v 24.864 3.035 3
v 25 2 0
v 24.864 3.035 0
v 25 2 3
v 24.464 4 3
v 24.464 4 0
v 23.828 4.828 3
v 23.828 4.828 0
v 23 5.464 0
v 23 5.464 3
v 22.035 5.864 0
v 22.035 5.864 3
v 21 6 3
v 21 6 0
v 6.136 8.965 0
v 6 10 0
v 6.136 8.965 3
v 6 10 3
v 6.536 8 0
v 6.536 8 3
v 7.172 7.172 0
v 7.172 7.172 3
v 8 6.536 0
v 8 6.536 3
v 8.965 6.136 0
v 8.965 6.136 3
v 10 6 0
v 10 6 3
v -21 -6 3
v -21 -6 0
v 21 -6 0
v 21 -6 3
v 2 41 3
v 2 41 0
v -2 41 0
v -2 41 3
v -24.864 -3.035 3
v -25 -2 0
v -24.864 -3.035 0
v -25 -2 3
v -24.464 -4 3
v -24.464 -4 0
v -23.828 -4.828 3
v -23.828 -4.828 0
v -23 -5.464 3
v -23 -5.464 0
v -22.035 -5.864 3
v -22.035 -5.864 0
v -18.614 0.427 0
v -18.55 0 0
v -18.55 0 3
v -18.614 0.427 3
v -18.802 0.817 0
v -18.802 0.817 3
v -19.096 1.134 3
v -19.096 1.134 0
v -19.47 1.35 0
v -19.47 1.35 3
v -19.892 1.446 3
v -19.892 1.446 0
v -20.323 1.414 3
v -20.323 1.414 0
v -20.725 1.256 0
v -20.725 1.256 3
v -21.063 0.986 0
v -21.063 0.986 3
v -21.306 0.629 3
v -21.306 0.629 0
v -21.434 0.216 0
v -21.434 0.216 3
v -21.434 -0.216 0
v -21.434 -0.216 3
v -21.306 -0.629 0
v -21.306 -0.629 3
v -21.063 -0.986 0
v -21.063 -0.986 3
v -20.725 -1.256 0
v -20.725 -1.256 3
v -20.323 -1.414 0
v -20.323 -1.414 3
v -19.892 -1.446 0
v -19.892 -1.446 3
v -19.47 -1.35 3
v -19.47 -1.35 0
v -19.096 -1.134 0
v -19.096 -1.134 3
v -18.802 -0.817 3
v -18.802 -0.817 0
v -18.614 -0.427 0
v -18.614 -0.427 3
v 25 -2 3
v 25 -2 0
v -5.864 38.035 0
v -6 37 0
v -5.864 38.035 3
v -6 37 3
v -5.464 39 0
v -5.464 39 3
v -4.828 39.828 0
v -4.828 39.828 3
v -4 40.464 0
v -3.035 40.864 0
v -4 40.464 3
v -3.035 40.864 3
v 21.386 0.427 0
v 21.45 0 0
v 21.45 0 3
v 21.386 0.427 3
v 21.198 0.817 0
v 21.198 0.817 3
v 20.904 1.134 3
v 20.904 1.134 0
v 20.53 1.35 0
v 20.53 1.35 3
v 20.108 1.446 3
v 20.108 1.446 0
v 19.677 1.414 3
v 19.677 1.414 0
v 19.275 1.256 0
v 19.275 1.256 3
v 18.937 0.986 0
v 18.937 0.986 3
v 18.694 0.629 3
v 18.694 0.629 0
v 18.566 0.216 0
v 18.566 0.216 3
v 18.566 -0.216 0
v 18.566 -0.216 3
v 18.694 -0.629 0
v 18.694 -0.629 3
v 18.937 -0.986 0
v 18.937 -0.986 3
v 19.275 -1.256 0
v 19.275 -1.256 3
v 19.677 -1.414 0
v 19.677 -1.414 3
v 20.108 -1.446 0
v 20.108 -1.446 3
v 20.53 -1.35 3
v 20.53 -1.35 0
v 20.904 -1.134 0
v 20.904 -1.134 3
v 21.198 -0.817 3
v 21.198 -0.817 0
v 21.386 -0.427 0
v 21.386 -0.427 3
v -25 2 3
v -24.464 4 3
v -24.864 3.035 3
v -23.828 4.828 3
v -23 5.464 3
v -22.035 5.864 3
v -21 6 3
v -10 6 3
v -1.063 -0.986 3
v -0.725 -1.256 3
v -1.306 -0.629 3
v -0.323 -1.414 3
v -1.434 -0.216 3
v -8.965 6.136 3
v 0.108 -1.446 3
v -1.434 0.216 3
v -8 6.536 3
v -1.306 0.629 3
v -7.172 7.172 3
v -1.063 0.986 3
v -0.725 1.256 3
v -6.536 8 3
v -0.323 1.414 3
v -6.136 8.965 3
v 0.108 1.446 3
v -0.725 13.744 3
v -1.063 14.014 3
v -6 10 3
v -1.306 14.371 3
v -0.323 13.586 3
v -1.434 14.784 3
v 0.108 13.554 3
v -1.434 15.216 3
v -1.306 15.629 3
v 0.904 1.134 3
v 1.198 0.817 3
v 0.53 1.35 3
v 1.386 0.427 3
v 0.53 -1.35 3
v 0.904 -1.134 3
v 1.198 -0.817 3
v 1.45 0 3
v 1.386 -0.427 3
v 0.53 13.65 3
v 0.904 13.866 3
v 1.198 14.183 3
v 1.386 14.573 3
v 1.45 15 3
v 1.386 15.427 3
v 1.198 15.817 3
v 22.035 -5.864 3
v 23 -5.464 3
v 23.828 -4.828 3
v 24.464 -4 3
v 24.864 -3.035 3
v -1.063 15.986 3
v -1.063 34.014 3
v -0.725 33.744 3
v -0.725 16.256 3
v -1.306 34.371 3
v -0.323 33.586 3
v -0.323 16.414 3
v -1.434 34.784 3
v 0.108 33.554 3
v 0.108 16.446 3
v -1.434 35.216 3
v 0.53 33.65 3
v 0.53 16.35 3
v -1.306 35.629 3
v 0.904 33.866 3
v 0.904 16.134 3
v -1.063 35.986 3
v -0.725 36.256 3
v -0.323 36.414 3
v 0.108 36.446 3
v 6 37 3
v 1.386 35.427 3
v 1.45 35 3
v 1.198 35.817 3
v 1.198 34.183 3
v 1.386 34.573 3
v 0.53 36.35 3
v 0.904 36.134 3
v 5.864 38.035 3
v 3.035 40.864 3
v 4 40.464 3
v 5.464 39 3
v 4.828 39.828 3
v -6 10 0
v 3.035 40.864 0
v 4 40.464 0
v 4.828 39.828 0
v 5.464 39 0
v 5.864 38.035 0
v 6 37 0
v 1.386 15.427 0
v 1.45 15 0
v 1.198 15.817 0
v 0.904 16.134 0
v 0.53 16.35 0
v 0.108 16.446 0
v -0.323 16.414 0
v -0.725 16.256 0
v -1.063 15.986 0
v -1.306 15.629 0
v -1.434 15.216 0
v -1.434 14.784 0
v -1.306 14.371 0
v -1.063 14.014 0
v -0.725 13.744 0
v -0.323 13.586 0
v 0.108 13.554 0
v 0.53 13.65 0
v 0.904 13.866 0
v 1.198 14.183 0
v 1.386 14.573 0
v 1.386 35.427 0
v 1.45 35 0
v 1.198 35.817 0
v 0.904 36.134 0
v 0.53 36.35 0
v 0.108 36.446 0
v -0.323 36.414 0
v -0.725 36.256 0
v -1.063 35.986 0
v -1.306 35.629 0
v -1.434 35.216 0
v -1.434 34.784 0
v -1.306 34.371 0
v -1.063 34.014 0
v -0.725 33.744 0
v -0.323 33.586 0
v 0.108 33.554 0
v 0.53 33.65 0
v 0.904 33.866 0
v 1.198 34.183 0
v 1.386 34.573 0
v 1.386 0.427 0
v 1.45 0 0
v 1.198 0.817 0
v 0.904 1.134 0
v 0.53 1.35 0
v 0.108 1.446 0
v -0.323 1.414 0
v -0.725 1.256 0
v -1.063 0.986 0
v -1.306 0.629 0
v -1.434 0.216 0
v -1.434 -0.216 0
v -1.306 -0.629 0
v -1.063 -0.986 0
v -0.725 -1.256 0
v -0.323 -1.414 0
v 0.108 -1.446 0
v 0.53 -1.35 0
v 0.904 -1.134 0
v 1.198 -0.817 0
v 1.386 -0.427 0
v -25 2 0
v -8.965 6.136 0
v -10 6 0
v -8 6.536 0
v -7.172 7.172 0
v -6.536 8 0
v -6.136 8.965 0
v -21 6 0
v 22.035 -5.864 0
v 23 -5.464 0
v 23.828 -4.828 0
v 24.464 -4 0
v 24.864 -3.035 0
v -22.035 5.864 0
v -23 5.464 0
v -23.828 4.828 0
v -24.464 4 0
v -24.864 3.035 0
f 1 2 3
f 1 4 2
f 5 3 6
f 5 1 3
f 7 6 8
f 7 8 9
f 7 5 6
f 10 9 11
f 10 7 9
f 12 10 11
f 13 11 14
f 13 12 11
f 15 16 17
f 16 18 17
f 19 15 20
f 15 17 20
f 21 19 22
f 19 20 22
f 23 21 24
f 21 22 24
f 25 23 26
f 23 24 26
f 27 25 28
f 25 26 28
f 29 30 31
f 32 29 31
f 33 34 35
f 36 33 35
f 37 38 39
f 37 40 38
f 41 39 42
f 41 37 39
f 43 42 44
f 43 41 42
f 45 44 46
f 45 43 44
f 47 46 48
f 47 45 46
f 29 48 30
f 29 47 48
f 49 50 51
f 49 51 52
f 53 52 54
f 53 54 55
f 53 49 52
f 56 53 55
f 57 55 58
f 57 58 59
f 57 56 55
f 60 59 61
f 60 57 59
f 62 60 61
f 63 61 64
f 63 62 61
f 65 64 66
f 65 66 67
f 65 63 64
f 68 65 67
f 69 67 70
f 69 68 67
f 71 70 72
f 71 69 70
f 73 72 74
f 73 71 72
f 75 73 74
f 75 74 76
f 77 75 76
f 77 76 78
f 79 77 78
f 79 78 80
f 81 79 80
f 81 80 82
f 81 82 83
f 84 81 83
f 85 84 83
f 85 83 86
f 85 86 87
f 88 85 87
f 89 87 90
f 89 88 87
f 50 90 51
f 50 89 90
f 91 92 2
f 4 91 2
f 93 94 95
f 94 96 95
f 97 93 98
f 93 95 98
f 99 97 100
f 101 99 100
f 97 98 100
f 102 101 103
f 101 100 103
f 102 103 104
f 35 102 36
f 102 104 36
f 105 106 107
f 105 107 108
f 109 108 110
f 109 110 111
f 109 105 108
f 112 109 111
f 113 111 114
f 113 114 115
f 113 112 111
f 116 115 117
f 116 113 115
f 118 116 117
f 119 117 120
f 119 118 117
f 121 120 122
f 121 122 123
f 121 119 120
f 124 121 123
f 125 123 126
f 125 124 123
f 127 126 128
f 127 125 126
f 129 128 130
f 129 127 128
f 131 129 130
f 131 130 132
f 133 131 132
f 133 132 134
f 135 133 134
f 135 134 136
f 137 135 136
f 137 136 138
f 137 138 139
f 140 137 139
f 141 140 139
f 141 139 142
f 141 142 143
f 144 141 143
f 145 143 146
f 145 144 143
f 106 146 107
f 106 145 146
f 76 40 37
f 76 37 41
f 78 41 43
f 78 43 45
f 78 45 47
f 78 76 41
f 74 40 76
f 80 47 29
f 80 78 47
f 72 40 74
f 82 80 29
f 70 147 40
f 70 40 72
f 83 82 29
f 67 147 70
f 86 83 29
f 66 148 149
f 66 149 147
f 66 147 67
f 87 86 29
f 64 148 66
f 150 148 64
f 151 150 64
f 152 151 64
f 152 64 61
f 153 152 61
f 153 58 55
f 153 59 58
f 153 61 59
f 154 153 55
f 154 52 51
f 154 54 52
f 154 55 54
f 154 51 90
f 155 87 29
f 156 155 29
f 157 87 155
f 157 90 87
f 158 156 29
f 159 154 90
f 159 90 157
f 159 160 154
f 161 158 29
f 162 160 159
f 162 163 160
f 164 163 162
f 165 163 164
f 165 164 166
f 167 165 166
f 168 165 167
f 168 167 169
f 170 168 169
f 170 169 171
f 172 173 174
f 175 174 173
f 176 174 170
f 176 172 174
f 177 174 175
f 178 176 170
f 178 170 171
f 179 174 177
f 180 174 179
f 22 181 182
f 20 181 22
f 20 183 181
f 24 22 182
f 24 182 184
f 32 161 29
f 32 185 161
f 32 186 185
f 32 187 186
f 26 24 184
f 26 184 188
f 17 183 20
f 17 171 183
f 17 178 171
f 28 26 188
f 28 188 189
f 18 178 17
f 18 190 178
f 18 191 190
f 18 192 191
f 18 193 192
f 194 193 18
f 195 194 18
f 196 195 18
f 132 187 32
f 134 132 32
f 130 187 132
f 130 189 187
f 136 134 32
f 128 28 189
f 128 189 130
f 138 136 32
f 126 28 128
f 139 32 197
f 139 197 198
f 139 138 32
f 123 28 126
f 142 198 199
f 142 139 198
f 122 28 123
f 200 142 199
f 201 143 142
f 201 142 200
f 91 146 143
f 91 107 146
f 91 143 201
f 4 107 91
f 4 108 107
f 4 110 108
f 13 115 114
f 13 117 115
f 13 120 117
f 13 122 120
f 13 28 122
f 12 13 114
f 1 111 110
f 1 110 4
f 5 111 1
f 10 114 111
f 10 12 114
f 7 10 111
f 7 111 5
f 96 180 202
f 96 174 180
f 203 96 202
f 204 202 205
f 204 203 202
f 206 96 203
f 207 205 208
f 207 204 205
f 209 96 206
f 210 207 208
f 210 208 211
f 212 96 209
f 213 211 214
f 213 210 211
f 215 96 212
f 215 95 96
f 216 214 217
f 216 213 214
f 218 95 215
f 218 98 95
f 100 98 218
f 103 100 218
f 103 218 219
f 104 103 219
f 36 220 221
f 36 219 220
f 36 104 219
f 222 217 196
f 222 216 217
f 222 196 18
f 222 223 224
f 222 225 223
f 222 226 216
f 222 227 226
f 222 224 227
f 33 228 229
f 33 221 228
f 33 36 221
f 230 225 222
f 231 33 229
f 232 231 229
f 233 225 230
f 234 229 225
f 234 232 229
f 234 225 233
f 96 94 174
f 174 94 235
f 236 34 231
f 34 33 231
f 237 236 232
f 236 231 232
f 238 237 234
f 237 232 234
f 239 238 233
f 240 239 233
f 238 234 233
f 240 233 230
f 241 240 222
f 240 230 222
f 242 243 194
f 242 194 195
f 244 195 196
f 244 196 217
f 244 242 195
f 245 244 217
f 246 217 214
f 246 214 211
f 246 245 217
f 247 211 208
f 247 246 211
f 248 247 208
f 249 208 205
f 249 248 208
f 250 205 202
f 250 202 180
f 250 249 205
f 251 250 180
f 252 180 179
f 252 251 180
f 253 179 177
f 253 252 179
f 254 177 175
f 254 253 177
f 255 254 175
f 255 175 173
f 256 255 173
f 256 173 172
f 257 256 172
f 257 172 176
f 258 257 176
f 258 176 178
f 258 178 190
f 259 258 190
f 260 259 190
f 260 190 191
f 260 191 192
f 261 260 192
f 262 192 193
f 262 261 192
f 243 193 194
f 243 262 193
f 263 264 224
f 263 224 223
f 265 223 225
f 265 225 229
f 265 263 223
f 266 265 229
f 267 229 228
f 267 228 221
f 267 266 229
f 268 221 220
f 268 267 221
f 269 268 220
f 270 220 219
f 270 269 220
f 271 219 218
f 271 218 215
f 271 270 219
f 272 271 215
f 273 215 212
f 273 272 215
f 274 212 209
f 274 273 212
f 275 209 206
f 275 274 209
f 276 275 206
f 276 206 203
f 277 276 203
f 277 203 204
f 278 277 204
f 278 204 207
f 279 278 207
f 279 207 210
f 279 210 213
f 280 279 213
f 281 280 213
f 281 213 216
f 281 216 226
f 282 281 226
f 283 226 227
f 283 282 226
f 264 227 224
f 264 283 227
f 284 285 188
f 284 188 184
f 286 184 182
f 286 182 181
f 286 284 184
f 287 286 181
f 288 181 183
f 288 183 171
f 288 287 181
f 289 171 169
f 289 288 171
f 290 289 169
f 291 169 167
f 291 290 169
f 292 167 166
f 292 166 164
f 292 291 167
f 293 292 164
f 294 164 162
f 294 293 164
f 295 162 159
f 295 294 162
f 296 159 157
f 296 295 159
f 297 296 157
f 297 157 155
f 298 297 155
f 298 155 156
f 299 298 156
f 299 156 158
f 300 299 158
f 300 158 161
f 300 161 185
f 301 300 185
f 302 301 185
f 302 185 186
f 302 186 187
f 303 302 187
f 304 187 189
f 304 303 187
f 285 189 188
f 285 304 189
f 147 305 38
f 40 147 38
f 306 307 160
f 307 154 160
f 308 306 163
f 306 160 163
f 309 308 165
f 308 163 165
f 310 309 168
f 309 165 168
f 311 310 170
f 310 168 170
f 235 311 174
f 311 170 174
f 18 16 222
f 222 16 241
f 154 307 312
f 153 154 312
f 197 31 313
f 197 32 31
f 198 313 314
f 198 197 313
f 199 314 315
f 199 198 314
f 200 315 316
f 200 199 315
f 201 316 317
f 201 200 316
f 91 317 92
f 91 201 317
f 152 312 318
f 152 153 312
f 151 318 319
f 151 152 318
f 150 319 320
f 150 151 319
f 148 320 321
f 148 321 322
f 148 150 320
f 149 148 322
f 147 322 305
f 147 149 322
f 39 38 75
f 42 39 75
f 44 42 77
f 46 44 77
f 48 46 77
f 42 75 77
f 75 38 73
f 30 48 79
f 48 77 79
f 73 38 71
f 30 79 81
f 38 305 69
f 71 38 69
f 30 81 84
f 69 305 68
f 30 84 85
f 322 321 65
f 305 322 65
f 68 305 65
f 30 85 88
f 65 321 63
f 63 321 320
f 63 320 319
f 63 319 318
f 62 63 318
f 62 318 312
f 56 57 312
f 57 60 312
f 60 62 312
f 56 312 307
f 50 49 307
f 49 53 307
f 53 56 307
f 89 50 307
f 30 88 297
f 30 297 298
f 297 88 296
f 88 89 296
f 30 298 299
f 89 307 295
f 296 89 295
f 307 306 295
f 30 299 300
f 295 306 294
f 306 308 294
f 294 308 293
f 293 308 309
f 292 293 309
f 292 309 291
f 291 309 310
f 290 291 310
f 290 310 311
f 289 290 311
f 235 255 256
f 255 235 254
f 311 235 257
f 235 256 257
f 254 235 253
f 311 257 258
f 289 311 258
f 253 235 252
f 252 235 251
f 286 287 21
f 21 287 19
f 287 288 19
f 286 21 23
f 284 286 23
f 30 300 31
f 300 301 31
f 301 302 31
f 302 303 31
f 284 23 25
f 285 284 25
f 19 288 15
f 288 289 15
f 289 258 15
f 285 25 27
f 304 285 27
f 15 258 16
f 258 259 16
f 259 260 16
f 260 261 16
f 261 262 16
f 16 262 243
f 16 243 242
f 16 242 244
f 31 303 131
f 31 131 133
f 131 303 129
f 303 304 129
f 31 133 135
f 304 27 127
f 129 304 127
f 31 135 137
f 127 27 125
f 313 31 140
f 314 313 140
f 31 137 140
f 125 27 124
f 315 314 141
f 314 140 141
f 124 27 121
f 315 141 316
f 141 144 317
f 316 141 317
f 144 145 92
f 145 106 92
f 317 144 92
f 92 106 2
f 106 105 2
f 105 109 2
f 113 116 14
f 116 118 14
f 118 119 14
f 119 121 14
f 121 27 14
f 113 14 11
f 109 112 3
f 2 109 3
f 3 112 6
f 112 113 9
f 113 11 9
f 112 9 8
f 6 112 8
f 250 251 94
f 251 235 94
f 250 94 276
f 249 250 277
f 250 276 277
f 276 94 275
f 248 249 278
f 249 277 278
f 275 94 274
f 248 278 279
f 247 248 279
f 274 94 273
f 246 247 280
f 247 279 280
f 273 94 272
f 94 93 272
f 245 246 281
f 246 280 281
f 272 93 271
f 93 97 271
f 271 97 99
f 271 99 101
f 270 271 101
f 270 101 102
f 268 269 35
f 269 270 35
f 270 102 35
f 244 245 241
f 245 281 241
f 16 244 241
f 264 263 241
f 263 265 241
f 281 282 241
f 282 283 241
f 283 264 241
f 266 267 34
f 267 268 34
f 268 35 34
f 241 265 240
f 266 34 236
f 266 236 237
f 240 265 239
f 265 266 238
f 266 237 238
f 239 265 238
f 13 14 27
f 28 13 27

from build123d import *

# Parameters (mm, degrees)
SKETCH_1_R      = 1.45
EXTRUDE_1_DEPTH = 3
FILLET_1_R      = 4


with BuildPart() as part:
    # 草图1 → 凸台-拉伸1 (new body)
    with BuildSketch(Plane.XY):
        Polygon((-6, 6), (-25, 6), (-25, -6), (25, -6), (25, 6), (6, 6), (6, 41), (-6, 41), align=None)
        with Locations((0, 35)):
            Circle(SKETCH_1_R, mode=Mode.SUBTRACT)
        Circle(SKETCH_1_R, mode=Mode.SUBTRACT)
        with Locations((-20, 0)):
            Circle(SKETCH_1_R, mode=Mode.SUBTRACT)
        with Locations((20, 0)):
            Circle(SKETCH_1_R, mode=Mode.SUBTRACT)
        with Locations((0, 15)):
            Circle(SKETCH_1_R, mode=Mode.SUBTRACT)
    extrude(amount=EXTRUDE_1_DEPTH)

    # 圆角1
    fillet_1_edges = [part.edges().sort_by_distance(p)[0] for p in [
        (-6, 41, 1.5),
        (6, 41, 1.5),
        (6, 6, 1.5),
        (25, 6, 1.5),
        (25, -6, 1.5),
        (-25, -6, 1.5),
        (-25, 6, 1.5),
        (-6, 6, 1.5),
    ]]
    fillet(fillet_1_edges, radius=FILLET_1_R)


solid = part.part
